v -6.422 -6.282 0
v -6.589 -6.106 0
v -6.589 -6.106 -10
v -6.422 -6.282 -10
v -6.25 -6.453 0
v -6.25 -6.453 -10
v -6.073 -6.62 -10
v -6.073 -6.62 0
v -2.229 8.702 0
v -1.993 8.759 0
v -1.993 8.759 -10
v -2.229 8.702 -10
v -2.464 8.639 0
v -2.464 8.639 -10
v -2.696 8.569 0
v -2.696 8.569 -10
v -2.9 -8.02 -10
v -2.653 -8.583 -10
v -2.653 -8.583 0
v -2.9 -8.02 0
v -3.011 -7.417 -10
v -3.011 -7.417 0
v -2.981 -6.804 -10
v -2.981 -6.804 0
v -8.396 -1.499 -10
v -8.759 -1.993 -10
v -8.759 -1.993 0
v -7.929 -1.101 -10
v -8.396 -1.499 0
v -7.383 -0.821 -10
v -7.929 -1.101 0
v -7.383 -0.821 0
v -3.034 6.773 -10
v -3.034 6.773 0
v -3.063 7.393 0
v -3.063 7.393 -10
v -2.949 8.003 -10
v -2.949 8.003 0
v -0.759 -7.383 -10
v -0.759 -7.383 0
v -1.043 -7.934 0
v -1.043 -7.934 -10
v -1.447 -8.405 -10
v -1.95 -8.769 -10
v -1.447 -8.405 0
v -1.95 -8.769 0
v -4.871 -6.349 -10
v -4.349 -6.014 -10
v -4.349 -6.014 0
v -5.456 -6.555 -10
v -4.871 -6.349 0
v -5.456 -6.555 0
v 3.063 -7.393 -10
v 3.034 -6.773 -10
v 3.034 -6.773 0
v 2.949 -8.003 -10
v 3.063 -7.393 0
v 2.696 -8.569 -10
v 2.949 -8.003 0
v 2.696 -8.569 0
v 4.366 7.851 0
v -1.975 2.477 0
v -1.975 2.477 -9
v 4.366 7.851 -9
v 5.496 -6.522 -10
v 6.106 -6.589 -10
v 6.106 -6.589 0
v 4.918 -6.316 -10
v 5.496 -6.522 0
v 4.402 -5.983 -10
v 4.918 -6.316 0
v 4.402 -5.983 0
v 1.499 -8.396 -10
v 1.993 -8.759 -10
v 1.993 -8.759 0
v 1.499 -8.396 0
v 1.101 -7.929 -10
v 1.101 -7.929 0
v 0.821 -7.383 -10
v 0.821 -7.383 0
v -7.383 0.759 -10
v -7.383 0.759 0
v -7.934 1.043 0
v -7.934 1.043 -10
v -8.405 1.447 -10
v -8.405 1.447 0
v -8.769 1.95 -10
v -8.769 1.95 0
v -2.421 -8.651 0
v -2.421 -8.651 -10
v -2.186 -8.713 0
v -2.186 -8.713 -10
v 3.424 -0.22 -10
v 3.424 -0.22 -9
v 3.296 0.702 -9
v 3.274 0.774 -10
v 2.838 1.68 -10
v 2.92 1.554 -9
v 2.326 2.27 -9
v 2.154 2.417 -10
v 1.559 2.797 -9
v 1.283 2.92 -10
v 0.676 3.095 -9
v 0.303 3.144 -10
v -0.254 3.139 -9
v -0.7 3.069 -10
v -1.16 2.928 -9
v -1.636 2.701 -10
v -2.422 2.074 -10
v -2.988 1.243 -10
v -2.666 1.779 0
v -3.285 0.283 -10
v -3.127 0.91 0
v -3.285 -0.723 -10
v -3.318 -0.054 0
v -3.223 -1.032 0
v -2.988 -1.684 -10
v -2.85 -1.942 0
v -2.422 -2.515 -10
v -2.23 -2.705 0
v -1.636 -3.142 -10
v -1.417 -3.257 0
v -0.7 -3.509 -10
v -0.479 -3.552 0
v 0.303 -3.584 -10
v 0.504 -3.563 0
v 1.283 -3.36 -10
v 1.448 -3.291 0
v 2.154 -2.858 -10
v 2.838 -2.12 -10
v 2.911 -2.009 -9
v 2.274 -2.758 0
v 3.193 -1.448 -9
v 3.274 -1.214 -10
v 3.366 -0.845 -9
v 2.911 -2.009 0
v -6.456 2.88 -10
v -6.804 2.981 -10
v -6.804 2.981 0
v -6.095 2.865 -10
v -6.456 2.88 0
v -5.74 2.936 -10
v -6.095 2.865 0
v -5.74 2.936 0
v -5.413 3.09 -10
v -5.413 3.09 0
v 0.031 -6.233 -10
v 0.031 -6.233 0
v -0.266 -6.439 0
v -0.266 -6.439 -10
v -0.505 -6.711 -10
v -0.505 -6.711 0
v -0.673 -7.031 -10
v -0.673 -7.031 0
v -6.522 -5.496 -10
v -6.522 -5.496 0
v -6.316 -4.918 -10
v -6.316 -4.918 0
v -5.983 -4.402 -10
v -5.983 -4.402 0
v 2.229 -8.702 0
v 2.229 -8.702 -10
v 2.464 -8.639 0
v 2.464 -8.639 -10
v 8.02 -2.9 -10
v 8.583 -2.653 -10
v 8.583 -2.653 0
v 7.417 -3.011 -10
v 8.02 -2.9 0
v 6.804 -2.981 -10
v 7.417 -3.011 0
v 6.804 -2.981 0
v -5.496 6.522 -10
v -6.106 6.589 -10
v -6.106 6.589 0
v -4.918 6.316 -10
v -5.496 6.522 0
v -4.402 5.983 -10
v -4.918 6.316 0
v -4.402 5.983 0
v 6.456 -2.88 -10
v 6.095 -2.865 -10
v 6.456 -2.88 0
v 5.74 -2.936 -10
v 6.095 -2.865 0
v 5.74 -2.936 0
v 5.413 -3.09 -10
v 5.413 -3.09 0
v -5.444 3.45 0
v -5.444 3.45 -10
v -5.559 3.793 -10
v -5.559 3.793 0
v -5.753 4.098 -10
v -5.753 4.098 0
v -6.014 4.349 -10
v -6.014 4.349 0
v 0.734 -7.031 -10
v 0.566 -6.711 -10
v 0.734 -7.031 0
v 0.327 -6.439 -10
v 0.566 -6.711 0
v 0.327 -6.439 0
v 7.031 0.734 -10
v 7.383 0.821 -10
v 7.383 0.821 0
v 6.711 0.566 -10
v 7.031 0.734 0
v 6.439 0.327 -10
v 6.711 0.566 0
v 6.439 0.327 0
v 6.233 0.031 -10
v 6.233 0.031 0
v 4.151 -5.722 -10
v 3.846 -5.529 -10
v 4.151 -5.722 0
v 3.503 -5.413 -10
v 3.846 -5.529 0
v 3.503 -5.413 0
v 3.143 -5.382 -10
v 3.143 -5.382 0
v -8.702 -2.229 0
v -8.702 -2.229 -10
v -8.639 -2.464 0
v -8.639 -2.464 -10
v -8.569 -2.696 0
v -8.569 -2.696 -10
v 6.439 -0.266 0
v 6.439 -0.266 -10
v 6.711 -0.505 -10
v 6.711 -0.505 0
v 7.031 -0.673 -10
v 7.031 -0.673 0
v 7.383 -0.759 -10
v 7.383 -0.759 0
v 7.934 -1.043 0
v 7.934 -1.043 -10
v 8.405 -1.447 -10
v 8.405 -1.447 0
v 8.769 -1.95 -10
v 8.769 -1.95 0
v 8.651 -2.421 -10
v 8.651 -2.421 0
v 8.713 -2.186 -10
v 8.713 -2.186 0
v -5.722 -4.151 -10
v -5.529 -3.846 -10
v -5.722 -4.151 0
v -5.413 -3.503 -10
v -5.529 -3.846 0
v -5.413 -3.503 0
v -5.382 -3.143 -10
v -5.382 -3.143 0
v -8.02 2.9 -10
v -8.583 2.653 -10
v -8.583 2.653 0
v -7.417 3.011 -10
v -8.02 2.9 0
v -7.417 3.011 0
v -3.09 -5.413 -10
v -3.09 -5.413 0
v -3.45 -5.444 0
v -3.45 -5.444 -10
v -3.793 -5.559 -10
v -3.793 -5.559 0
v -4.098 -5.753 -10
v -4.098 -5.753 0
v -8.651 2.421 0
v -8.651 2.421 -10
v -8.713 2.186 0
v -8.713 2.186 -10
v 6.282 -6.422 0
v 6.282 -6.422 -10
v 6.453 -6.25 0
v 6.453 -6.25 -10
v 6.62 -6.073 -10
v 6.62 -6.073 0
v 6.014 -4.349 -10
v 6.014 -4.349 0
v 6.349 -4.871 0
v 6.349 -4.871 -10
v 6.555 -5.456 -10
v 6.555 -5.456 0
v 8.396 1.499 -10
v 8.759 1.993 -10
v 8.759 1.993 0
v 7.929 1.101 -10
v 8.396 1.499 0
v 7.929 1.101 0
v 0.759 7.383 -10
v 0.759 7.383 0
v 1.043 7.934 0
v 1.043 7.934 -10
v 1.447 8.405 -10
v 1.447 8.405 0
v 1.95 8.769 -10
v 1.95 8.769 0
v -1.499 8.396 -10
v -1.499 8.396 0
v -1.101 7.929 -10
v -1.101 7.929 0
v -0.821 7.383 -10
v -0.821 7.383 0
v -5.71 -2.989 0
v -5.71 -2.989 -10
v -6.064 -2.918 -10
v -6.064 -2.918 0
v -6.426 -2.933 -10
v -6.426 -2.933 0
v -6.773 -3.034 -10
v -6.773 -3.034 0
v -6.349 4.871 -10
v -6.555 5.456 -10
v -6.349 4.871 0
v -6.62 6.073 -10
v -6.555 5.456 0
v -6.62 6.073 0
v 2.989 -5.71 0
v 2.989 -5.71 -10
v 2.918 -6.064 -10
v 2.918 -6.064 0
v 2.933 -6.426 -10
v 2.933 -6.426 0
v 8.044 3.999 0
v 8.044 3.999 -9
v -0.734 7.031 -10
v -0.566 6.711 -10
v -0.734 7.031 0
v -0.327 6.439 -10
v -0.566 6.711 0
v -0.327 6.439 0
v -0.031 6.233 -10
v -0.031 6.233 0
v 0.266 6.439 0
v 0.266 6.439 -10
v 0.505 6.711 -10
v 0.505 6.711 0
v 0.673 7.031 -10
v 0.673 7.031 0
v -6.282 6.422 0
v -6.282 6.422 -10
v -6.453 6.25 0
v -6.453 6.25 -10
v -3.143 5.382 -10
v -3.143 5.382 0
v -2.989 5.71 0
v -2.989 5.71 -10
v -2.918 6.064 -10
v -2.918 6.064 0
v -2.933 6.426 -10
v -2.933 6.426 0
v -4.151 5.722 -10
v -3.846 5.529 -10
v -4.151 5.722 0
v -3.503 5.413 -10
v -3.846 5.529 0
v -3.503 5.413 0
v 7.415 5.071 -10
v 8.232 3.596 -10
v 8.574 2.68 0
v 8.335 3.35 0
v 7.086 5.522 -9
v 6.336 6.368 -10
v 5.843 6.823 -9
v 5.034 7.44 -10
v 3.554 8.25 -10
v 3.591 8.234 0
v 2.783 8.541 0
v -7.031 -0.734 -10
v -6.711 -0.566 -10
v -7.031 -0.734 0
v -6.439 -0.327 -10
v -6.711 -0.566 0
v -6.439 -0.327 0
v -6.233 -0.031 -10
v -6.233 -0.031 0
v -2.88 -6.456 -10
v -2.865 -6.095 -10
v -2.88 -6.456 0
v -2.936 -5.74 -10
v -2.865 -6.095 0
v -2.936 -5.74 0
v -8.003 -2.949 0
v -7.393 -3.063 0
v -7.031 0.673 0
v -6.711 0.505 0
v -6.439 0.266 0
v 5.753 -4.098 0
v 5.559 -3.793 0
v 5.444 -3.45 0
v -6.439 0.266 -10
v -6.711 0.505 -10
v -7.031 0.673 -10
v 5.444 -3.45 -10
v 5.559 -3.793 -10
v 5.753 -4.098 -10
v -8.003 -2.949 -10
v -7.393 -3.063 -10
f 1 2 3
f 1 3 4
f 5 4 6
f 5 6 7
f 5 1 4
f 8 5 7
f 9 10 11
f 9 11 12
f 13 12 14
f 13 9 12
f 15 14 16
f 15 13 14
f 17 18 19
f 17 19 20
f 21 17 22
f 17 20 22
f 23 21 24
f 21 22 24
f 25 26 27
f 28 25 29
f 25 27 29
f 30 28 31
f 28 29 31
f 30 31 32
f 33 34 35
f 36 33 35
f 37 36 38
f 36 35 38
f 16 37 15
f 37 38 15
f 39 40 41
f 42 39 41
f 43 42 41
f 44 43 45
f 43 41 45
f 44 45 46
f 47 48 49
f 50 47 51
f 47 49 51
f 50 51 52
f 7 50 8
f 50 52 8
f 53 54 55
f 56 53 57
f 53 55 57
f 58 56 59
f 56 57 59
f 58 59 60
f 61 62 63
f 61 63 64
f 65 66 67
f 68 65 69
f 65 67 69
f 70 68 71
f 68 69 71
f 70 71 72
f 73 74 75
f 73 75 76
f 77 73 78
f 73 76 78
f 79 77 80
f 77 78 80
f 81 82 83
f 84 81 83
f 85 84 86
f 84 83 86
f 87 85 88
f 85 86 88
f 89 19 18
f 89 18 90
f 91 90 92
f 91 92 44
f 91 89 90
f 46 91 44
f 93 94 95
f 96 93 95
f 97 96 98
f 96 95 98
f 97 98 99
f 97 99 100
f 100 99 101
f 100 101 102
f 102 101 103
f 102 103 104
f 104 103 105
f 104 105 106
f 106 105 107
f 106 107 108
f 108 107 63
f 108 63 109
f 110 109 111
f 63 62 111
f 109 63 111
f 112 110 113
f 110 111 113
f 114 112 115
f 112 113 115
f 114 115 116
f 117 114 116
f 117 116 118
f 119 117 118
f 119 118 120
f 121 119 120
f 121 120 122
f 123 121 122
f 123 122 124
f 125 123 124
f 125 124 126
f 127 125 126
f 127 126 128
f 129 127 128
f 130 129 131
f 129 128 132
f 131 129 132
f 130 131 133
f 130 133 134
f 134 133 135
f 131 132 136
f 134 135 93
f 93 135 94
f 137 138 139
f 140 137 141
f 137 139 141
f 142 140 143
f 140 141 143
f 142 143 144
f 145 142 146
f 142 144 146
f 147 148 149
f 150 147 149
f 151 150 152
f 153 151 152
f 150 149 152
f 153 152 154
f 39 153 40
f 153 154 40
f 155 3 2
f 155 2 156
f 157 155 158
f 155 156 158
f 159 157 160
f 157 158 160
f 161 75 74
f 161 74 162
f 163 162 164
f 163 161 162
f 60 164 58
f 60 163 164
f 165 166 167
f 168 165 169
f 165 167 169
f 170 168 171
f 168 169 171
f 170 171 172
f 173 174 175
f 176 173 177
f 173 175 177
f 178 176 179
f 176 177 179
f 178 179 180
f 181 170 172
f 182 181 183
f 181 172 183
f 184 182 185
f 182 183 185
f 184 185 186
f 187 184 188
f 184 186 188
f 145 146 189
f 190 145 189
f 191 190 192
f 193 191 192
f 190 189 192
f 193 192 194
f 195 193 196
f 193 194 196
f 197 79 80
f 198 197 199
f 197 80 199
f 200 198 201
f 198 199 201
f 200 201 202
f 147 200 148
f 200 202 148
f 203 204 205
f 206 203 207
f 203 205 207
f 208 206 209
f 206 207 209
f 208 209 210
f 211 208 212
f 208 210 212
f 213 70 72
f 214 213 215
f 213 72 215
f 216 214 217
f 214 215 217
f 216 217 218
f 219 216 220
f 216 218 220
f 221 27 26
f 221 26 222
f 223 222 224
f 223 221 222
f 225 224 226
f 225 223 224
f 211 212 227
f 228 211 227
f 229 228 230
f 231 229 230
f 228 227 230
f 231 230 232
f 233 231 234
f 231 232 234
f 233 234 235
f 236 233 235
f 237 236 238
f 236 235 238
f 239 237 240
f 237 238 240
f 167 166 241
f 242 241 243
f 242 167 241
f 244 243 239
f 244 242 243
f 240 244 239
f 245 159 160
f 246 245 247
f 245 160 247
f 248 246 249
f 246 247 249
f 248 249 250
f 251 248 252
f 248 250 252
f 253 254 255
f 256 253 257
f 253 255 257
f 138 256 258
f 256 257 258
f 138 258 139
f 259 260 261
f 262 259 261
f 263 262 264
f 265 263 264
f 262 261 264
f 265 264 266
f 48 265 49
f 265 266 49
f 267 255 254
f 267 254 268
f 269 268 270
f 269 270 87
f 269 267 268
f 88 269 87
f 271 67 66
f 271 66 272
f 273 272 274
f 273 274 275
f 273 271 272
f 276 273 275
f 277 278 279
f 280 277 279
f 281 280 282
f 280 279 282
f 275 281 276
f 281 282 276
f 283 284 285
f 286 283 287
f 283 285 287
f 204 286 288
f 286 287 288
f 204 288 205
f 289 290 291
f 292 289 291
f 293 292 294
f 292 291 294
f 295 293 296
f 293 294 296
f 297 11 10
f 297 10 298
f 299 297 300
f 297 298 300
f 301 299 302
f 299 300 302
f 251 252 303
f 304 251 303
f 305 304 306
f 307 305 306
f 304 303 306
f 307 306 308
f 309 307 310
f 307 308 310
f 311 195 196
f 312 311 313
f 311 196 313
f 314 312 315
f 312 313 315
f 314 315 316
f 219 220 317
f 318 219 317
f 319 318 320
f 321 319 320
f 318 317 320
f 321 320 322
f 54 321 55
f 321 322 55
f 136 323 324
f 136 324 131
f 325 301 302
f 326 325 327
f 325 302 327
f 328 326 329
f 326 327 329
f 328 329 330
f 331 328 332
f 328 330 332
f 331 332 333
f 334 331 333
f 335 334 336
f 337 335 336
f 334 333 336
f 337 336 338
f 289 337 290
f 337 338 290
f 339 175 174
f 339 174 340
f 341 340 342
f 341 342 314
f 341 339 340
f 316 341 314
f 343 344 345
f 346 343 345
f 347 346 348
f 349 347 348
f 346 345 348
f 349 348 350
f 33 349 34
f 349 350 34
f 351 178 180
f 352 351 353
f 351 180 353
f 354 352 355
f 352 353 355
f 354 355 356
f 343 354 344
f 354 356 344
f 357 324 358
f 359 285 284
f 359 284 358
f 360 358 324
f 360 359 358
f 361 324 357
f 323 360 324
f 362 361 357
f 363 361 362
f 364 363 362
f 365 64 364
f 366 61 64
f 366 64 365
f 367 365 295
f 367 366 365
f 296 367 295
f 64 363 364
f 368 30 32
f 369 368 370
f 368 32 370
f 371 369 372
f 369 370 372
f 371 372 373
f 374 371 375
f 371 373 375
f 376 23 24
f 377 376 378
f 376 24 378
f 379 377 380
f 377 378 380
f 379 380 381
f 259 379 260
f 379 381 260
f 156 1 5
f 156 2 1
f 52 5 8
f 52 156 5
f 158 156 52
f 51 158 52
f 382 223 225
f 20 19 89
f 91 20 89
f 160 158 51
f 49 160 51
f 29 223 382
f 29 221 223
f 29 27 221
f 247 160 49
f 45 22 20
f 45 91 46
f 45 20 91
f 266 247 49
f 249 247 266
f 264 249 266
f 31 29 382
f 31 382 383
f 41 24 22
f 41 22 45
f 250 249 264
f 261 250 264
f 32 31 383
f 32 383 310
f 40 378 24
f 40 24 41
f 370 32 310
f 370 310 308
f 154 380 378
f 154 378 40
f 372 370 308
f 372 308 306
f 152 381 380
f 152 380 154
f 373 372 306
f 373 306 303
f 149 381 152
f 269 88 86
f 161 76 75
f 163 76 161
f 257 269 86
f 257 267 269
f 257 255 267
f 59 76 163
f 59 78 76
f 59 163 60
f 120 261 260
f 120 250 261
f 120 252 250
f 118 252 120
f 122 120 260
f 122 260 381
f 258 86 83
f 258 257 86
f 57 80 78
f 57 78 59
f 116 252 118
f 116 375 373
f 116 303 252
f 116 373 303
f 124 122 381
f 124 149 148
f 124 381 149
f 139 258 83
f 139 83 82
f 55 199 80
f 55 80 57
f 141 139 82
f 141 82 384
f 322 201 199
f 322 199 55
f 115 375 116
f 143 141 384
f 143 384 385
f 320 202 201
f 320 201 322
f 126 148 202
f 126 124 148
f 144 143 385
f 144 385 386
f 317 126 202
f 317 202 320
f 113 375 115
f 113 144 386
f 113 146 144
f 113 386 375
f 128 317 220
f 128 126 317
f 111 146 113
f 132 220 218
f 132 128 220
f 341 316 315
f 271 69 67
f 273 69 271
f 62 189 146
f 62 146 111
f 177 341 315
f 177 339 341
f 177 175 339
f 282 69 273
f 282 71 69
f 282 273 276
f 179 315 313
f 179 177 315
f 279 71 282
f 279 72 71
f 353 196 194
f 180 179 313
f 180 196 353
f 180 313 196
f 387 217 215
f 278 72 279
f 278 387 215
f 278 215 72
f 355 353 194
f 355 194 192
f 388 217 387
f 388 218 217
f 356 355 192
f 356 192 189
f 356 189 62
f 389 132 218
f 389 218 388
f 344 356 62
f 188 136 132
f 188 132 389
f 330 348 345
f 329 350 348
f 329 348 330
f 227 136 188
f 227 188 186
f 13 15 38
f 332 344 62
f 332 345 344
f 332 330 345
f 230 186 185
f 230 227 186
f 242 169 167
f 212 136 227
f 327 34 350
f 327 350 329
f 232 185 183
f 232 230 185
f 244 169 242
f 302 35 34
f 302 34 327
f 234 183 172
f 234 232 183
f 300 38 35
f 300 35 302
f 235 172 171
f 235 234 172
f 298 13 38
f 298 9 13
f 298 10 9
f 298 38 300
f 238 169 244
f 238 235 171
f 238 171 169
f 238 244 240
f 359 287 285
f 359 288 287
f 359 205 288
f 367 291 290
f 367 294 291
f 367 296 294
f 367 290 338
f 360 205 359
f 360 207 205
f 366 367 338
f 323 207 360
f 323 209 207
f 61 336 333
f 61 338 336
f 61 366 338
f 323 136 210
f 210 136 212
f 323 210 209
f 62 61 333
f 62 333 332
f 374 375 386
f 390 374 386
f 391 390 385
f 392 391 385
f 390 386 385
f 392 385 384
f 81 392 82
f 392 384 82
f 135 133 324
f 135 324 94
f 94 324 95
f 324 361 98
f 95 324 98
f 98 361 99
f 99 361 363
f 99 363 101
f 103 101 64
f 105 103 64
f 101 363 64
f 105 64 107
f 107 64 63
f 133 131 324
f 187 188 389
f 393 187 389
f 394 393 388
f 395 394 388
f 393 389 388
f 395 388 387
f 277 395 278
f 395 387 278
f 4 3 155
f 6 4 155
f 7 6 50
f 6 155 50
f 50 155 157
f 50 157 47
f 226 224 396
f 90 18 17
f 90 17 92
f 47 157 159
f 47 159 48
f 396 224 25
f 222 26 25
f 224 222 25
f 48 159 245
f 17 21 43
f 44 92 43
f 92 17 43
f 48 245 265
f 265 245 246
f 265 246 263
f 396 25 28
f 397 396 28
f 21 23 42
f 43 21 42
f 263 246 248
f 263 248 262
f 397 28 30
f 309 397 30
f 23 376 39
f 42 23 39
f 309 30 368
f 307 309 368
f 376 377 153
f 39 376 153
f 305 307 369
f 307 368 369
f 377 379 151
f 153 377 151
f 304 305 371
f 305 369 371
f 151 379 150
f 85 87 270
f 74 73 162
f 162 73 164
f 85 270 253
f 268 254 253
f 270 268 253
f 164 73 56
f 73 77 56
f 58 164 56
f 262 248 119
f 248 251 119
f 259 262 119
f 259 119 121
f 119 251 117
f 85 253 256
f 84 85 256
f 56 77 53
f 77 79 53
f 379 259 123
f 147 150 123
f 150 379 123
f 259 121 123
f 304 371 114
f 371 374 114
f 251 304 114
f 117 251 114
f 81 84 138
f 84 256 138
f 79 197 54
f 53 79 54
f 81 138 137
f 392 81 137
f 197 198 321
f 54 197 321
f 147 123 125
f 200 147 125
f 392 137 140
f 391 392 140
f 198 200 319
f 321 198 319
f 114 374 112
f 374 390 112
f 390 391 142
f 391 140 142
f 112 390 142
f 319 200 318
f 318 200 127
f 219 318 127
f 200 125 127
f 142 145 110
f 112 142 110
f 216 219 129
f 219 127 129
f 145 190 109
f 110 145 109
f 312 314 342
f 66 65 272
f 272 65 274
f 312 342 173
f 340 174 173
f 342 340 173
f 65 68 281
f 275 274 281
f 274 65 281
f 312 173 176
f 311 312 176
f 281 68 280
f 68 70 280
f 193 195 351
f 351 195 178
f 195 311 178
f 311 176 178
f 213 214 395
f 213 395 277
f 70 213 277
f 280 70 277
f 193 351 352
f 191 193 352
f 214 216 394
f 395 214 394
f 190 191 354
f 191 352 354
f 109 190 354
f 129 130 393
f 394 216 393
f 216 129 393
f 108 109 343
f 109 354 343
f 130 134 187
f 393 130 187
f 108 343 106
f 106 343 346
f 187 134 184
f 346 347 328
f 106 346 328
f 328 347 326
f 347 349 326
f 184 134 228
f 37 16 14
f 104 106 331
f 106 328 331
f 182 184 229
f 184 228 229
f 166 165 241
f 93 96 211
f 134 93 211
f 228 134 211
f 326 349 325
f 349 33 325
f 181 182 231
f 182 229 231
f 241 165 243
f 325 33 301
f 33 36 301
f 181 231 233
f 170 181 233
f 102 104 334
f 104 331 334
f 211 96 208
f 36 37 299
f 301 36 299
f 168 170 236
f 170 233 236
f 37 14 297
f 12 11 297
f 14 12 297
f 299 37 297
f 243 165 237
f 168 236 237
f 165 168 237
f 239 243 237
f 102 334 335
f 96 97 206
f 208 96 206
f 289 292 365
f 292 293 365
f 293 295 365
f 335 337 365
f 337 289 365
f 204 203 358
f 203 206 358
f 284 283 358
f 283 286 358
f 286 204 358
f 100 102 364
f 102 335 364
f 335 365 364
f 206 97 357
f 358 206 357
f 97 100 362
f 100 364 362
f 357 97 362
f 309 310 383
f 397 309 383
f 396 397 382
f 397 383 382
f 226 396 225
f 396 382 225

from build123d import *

# Parameters (mm, degrees)
SKETCH1_R           = 8.98338725
BOSS_EXTRUDE2_DEPTH = 10
CUT_EXTRUDE1_DEPTH  = 9
SKETCH9_R           = 3.37330117
CUT_EXTRUDE4_DEPTH  = 10
CUT_EXTRUDE5_DEPTH  = 10
CIRPATTERN2_COUNT   = 10
CIRPATTERN2_ANGLE   = 270


with BuildPart() as part:
    # Sketch1 → Boss-Extrude2 (new body)
    with BuildSketch(Plane.XY):
        Circle(SKETCH1_R)
    extrude(amount=-BOSS_EXTRUDE2_DEPTH)

    # Sketch2 → Cut-Extrude1 (cut)
    with BuildSketch(Plane.XY):
        with BuildLine():
            Line((-1.97475772, 2.477093755), (4.365982639, 7.851079039))
            ThreePointArc((4.365982639, 7.851079039), (6.497023817, 6.204025146), (8.044056542, 3.999300044))
            Line((8.044056542, 3.999300044), (2.911023025, -2.008935037))
            ThreePointArc((2.911023025, -2.008935037), (-2.230434429, -2.704958194), (-1.97475772, 2.477093755))
        make_face()
    extrude(amount=-CUT_EXTRUDE1_DEPTH, mode=Mode.SUBTRACT)

    # Sketch9 → Cut-Extrude4 (cut)
    with BuildSketch(Plane.XY):
        with Locations((0.051031531, -0.220189823)):
            Circle(SKETCH9_R)
    extrude(amount=-CUT_EXTRUDE4_DEPTH, mode=Mode.SUBTRACT)

    # Sketch10 → Cut-Extrude5 (cut)
    with BuildSketch(Plane.XY):
        with BuildLine():
            ThreePointArc((-0.030614018, 6.232538227), (0.505170096, 6.710825662), (0.759385982, 7.382538227))
            ThreePointArc((0.759385982, 7.382538227), (1.276411254, 8.232191257), (2.069385982, 8.832538227))
            ThreePointArc((2.069385982, 8.832538227), (-0.030614018, 8.990934274), (-2.130614018, 8.832538227))
            ThreePointArc((-2.130614018, 8.832538227), (-1.33763929, 8.232191257), (-0.820614018, 7.382538227))
            ThreePointArc((-0.820614018, 7.382538227), (-0.566398131, 6.710825662), (-0.030614018, 6.232538227))
        make_face()
    cut_extrude5 = extrude(amount=-CUT_EXTRUDE5_DEPTH, mode=Mode.SUBTRACT)

    # CirPattern2: Cut-Extrude5 ×10 about axis
    cirpattern2_axis = Axis((0, 0, 0), (0, 0, 1))
    for i in range(1, CIRPATTERN2_COUNT):
        add(cut_extrude5.rotate(cirpattern2_axis, i * CIRPATTERN2_ANGLE / (CIRPATTERN2_COUNT - 1)), mode=Mode.SUBTRACT)


solid = part.part
